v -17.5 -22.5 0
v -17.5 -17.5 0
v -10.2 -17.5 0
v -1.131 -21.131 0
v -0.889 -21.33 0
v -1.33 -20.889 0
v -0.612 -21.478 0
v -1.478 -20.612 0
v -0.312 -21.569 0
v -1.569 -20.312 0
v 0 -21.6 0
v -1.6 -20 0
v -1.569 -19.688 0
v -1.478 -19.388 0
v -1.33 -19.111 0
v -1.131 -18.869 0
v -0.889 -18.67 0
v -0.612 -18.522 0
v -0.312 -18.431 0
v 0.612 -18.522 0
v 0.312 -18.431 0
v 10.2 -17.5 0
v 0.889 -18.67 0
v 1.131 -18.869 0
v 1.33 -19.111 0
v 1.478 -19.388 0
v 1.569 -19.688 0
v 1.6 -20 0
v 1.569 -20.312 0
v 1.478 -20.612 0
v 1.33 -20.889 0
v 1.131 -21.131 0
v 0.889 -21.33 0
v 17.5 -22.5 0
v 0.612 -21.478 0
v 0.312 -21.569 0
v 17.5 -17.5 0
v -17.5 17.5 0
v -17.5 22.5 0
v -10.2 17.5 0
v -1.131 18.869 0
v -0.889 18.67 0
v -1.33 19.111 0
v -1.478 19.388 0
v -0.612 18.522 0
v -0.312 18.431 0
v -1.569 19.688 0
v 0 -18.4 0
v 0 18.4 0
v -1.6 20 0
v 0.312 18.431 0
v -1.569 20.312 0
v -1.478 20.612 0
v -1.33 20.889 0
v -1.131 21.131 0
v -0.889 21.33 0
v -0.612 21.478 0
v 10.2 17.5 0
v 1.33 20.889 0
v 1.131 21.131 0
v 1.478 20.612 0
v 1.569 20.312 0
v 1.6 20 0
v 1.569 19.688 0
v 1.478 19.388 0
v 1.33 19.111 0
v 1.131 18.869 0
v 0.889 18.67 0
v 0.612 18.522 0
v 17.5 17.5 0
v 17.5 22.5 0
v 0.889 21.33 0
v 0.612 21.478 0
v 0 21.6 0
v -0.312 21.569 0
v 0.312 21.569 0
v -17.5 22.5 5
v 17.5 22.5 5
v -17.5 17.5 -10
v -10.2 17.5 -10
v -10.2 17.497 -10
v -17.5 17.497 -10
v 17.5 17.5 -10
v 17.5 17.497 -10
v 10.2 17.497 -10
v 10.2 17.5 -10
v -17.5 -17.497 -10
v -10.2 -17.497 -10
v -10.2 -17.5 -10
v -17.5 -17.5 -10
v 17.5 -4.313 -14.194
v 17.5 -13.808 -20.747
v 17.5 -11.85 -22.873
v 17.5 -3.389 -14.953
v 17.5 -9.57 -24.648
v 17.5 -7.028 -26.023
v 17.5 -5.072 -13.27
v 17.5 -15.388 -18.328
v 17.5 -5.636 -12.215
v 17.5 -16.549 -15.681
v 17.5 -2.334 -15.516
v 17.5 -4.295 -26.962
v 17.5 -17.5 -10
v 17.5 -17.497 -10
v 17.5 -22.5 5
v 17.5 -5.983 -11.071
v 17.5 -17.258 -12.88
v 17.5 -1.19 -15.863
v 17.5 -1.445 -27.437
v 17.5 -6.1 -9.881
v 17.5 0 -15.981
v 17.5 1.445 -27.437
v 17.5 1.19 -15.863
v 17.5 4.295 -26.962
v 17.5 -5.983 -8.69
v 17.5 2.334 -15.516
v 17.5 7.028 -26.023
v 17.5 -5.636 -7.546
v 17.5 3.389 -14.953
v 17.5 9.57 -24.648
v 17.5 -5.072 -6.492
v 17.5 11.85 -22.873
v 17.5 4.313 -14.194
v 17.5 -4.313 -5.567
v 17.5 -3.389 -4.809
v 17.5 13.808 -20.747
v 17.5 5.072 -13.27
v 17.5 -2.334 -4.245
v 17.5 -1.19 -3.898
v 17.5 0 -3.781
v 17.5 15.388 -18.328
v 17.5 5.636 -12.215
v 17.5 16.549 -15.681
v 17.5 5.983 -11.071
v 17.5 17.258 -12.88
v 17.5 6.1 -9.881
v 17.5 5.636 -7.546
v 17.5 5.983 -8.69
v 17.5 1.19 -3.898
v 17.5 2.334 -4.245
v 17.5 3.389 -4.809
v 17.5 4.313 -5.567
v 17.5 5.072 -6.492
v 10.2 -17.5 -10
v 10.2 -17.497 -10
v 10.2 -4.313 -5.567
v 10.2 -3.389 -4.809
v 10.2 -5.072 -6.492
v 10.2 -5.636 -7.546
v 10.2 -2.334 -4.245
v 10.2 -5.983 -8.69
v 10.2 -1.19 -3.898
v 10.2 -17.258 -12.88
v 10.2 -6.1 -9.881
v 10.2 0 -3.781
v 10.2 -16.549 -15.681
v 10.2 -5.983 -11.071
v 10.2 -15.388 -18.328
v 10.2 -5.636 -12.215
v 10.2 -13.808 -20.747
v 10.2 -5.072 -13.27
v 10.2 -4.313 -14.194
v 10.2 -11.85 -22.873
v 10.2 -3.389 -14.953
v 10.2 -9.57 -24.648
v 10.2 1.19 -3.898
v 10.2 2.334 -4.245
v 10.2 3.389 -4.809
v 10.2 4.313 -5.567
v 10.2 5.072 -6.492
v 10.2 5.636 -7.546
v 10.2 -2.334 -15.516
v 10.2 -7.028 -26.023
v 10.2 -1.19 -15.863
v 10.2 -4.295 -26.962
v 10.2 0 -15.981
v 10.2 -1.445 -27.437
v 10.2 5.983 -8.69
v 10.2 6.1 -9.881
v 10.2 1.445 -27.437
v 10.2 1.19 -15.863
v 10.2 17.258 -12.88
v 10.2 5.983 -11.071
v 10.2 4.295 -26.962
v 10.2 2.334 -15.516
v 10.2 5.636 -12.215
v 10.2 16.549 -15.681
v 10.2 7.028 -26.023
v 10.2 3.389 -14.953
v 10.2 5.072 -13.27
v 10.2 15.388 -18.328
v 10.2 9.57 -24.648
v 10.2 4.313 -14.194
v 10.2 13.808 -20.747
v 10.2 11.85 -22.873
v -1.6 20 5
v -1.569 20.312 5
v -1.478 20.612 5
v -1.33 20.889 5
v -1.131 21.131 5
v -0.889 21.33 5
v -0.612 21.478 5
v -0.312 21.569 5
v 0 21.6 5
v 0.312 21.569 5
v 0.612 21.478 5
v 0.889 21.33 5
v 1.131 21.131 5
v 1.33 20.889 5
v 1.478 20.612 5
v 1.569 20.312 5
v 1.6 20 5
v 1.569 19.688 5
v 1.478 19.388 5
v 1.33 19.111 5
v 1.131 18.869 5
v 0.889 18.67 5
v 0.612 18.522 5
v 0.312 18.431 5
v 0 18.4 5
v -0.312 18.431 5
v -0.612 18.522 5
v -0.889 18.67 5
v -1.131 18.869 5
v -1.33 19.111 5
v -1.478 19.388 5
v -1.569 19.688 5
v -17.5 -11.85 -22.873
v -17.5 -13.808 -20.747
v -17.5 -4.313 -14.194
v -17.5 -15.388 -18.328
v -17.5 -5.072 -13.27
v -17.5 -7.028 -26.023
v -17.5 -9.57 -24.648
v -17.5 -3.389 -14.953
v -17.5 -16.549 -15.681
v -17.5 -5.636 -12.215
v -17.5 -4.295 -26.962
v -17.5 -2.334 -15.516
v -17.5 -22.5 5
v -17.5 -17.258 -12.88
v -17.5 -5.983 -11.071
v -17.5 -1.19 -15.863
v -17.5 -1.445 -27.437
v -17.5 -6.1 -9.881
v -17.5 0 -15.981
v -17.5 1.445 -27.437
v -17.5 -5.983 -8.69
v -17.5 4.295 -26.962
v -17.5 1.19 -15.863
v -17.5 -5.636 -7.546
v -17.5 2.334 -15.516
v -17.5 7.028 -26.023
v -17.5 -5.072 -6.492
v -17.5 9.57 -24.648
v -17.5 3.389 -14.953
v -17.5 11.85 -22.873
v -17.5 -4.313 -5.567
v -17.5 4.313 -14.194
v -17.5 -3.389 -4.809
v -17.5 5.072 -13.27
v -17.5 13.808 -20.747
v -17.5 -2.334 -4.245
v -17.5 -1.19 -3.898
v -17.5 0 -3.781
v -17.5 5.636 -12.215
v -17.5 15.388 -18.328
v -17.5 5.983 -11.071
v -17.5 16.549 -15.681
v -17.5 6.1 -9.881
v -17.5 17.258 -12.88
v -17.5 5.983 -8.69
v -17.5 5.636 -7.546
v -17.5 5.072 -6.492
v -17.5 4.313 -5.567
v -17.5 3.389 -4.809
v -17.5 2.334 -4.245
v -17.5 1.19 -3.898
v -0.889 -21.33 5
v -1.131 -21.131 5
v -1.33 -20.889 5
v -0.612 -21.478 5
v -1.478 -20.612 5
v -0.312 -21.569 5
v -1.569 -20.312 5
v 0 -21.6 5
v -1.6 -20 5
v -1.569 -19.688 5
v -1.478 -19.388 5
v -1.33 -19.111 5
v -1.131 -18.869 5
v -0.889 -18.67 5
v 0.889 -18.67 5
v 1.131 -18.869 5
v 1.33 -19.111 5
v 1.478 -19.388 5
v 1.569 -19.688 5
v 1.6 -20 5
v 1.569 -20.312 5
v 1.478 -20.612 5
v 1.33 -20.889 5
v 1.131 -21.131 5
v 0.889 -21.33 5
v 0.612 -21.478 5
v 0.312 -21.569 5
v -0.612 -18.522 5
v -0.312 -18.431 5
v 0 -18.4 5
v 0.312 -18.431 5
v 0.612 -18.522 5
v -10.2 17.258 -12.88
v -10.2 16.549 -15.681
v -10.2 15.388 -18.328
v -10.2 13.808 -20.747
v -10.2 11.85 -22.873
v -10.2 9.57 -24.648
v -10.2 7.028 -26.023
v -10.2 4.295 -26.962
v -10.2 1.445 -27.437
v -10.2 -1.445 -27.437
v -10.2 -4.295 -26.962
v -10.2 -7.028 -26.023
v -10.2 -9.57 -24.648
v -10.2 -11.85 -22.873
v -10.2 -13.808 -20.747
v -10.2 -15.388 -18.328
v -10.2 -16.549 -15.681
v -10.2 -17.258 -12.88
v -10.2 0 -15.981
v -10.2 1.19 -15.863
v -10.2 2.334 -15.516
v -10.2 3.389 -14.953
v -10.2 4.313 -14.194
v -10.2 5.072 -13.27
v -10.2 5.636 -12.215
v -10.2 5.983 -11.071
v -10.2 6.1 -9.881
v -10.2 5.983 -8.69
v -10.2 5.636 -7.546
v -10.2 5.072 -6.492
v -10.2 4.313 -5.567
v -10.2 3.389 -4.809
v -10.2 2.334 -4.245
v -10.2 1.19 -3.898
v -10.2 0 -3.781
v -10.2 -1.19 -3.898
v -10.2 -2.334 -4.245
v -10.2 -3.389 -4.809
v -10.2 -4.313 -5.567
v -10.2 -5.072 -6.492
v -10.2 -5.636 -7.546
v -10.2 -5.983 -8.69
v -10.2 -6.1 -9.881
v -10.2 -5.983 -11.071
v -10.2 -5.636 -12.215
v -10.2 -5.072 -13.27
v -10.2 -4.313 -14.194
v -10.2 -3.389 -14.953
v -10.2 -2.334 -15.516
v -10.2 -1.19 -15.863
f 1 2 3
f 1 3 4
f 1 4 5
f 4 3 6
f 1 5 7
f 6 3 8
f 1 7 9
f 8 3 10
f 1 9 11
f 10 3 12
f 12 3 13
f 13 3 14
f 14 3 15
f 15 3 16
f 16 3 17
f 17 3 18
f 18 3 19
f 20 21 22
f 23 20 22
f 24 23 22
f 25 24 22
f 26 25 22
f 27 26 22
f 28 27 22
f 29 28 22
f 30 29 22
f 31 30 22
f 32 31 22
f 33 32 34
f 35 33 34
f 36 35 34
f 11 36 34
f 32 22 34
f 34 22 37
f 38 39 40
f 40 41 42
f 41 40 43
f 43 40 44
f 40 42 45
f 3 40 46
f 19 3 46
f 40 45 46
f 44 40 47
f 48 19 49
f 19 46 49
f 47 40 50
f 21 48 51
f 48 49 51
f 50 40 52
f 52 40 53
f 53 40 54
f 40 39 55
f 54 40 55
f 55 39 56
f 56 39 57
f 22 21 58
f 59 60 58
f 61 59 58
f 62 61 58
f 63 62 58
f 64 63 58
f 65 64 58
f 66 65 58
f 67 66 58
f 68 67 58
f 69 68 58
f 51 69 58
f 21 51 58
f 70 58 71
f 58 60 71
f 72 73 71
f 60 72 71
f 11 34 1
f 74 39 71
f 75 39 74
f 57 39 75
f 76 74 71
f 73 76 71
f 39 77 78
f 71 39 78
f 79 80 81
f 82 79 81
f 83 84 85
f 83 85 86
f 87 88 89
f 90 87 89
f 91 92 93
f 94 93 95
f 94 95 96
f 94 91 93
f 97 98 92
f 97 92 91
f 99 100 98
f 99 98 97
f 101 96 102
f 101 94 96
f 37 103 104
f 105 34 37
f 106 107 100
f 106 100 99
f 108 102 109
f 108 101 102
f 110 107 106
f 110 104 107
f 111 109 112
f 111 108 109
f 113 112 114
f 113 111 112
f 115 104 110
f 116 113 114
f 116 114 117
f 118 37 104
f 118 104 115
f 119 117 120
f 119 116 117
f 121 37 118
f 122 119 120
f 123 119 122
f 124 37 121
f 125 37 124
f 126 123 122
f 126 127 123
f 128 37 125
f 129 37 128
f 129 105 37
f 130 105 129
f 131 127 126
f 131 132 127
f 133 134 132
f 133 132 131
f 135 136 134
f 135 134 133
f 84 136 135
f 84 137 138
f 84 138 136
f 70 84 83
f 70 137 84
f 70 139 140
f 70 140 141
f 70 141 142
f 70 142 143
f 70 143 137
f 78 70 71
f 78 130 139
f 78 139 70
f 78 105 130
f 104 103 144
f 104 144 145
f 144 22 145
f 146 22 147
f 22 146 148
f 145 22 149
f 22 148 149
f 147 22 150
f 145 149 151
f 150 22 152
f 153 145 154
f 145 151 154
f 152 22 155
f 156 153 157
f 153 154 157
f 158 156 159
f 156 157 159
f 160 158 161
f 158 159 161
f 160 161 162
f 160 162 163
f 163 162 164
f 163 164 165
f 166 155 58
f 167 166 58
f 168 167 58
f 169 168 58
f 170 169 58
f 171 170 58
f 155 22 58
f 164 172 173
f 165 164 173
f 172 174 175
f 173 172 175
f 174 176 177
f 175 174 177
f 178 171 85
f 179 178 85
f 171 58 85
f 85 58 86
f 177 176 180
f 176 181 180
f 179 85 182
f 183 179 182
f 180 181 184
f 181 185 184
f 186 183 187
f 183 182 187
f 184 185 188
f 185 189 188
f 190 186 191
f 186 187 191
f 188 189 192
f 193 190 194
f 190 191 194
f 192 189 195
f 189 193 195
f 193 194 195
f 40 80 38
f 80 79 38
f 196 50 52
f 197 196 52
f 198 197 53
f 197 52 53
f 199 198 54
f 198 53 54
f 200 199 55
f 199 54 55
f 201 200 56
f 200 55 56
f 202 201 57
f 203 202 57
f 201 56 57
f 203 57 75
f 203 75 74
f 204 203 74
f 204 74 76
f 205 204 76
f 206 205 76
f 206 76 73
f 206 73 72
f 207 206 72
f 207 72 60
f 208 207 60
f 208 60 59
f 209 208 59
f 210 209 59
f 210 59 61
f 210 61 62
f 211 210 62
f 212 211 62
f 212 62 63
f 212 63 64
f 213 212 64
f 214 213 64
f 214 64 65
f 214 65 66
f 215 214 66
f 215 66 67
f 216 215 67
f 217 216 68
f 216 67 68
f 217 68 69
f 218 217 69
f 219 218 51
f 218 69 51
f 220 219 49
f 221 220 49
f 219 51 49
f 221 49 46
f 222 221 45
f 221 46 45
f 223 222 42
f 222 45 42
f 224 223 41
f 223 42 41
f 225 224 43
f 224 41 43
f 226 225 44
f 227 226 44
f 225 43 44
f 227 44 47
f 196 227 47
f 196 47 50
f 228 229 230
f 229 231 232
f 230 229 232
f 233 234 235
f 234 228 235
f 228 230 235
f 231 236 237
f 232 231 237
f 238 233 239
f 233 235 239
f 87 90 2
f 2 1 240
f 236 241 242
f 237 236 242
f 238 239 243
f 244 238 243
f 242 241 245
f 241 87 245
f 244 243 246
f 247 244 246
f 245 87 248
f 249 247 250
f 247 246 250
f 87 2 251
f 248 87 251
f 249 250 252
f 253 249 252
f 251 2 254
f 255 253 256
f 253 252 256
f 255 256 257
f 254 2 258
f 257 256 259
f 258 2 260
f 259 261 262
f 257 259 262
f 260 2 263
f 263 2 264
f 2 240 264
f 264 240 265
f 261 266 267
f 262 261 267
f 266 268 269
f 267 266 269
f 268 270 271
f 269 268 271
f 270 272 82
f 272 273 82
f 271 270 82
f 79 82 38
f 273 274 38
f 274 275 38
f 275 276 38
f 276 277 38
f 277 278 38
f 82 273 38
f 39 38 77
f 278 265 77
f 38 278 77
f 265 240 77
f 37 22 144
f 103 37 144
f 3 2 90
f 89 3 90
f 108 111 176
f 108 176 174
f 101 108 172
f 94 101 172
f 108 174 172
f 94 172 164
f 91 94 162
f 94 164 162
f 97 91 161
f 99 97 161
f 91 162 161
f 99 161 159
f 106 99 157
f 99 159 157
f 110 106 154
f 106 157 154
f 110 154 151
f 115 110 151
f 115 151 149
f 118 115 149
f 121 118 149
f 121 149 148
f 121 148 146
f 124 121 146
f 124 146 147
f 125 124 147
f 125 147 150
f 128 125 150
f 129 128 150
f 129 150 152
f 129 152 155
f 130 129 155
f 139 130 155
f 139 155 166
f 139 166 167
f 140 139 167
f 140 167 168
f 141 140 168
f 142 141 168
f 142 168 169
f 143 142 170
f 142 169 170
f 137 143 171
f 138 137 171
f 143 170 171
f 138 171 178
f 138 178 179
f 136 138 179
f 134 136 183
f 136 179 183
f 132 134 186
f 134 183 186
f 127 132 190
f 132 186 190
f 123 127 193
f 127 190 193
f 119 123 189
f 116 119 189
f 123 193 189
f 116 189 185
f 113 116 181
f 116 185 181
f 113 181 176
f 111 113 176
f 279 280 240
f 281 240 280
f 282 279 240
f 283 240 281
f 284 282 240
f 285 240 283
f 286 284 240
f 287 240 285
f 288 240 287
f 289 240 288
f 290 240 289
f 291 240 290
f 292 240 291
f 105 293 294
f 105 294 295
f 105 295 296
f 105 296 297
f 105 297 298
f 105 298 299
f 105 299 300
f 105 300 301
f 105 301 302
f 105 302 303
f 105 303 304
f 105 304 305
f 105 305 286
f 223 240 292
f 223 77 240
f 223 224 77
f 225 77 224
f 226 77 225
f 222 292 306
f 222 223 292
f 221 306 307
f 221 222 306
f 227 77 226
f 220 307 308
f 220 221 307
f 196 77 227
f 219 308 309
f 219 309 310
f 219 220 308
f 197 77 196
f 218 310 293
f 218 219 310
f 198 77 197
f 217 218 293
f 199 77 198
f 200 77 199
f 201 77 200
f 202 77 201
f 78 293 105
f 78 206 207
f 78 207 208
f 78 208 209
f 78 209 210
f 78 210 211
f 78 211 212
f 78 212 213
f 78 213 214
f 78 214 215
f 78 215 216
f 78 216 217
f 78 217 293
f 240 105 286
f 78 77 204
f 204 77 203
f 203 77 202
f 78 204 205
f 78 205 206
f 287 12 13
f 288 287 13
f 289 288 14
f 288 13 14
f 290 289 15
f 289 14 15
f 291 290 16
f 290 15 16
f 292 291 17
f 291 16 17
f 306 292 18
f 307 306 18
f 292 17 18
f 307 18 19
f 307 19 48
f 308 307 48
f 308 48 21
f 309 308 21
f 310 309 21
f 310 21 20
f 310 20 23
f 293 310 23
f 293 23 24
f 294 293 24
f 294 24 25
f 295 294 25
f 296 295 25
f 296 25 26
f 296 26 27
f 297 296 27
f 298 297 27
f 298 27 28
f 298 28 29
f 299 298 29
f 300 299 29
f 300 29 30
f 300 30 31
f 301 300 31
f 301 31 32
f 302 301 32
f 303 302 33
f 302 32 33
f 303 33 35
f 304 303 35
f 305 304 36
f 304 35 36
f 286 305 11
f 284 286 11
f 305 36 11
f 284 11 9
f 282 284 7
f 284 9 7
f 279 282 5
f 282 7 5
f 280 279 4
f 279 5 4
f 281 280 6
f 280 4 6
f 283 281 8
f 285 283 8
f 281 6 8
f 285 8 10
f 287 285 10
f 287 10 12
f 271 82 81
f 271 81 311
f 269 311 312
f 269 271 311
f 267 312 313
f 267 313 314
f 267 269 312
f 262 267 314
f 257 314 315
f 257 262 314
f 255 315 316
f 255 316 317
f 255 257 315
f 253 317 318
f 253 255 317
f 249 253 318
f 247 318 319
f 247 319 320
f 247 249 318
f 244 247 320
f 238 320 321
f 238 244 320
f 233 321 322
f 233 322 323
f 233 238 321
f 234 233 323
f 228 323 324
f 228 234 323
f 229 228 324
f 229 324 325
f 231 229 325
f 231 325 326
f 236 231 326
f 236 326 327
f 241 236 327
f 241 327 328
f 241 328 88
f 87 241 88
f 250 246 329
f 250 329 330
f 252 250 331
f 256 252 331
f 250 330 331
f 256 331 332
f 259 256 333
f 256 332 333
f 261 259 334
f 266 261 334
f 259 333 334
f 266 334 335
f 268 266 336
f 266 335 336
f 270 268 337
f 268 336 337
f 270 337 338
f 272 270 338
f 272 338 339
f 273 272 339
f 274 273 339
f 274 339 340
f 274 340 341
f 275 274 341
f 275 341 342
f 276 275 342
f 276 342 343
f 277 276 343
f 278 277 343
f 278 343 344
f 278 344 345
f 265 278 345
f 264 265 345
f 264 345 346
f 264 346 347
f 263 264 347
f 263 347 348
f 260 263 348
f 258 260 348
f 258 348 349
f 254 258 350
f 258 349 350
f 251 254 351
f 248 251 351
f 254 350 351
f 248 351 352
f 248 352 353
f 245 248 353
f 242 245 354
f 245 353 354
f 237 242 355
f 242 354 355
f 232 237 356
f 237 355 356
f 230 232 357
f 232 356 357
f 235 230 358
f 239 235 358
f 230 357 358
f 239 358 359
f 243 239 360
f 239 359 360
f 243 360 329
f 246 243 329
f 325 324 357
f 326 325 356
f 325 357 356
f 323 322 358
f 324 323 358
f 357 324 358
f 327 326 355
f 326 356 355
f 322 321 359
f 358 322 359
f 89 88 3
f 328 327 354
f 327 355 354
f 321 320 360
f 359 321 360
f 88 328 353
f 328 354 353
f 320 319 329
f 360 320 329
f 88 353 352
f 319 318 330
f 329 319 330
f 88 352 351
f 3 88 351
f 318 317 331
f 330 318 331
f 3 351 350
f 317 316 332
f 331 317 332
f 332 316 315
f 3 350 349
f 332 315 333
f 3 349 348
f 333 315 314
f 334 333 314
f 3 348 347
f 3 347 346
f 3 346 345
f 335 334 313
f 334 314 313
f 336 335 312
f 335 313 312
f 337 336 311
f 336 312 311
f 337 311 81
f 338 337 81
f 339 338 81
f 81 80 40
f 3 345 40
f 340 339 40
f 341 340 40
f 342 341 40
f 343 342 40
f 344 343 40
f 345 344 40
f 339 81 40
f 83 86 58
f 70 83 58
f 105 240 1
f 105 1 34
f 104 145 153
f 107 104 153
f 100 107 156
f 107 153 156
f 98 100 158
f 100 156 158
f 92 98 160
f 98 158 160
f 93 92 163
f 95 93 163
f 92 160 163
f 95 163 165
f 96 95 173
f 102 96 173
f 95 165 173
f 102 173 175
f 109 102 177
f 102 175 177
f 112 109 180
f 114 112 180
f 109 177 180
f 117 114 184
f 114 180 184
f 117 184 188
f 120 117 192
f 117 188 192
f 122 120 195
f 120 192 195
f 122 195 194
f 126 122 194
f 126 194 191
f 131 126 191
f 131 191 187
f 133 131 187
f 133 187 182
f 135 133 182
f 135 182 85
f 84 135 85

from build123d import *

# Parameters (mm, degrees)
SKETCH_1_W          = 35
SKETCH_1_H          = 35
EXTRUDE_1_DEPTH     = 5
EXTRUDE_2_DEPTH     = 7.3
EXTRUDE_START       = -7.3
EXTRUDE_3_DEPTH     = 7.3
SKETCH_4_W          = 35
SKETCH_4_H          = 45
EXTRUDE_4_DEPTH     = 5
SKETCH_6_R          = 6.1
CUT_EXTRUDE_1_DEPTH = 46.051329388
SKETCH_7_R          = 6.1
CUT_EXTRUDE_2_DEPTH = 46.051329388
SKETCH_8_R          = 1.6
CUT_EXTRUDE_3_DEPTH = 10


with BuildPart() as part:
    # 草图1 → 凸台-拉伸1 (new body)
    with BuildSketch(Plane.XY):
        Rectangle(SKETCH_1_W, SKETCH_1_H)
    extrude(amount=EXTRUDE_1_DEPTH)

    # 草图2 → 凸台-拉伸2 (add)
    with BuildSketch(Plane.ZY.offset(17.5)):
        with BuildLine():
            Line((5, 17.5), (-10, 17.5))
            Line((-10, 17.5), (-10, 17.496950369))
            ThreePointArc((-10, 17.496950369), (-27.496950369, 0), (-10, -17.496950369))
            Line((-10, -17.496950369), (-10, -17.5))
            Line((-10, -17.5), (5, -17.5))
            Line((5, -17.5), (5, 17.5))
        make_face()
    extrude(amount=-EXTRUDE_2_DEPTH)

    # 草图3 → 凸台-拉伸3 (add)
    with BuildSketch(Plane(origin=(17.5, 0, 0), x_dir=(0, 0, -1), z_dir=(1, 0, 0)).offset(EXTRUDE_START)):
        with BuildLine():
            Line((10, 17.5), (-5, 17.5))
            Line((-5, 17.5), (-5, -17.5))
            Line((-5, -17.5), (10, -17.5))
            Line((10, -17.5), (10, -17.496950369))
            ThreePointArc((10, -17.496950369), (27.496950369, 0), (10, 17.496950369))
            Line((10, 17.496950369), (10, 17.5))
        make_face()
    extrude(amount=EXTRUDE_3_DEPTH)

    # 草图4 → 凸台-拉伸4 (add)
    with BuildSketch(Plane.XY.offset(5)):
        Rectangle(SKETCH_4_W, SKETCH_4_H)
    extrude(amount=-EXTRUDE_4_DEPTH)

    # 草图6 → 切除-拉伸1 (cut, through all)
    with BuildSketch(Plane(origin=(-10.2, 0, 0), x_dir=(0, 0, -1), z_dir=(1, 0, 0))):
        with Locations((9.880544607, 0)):
            Circle(SKETCH_6_R)
    extrude(amount=-CUT_EXTRUDE_1_DEPTH, mode=Mode.SUBTRACT)

    # 草图7 → 切除-拉伸2 (cut, through all)
    with BuildSketch(Plane.ZY.offset(-10.2)):
        with Locations(Location((-9.880544607, 0, 0), (0, 0, 180))):
            Circle(SKETCH_7_R)
    extrude(amount=-CUT_EXTRUDE_2_DEPTH, mode=Mode.SUBTRACT)

    # 草图8 → 切除-拉伸3 (cut)
    with BuildSketch(Plane(origin=(0, 0, 0), x_dir=(-1, 0, 0), z_dir=(0, 0, -1))):
        with Locations((0, 20)):
            Circle(SKETCH_8_R)
        with Locations((0, -20)):
            Circle(SKETCH_8_R)
    extrude(amount=-CUT_EXTRUDE_3_DEPTH, mode=Mode.SUBTRACT)


solid = part.part
